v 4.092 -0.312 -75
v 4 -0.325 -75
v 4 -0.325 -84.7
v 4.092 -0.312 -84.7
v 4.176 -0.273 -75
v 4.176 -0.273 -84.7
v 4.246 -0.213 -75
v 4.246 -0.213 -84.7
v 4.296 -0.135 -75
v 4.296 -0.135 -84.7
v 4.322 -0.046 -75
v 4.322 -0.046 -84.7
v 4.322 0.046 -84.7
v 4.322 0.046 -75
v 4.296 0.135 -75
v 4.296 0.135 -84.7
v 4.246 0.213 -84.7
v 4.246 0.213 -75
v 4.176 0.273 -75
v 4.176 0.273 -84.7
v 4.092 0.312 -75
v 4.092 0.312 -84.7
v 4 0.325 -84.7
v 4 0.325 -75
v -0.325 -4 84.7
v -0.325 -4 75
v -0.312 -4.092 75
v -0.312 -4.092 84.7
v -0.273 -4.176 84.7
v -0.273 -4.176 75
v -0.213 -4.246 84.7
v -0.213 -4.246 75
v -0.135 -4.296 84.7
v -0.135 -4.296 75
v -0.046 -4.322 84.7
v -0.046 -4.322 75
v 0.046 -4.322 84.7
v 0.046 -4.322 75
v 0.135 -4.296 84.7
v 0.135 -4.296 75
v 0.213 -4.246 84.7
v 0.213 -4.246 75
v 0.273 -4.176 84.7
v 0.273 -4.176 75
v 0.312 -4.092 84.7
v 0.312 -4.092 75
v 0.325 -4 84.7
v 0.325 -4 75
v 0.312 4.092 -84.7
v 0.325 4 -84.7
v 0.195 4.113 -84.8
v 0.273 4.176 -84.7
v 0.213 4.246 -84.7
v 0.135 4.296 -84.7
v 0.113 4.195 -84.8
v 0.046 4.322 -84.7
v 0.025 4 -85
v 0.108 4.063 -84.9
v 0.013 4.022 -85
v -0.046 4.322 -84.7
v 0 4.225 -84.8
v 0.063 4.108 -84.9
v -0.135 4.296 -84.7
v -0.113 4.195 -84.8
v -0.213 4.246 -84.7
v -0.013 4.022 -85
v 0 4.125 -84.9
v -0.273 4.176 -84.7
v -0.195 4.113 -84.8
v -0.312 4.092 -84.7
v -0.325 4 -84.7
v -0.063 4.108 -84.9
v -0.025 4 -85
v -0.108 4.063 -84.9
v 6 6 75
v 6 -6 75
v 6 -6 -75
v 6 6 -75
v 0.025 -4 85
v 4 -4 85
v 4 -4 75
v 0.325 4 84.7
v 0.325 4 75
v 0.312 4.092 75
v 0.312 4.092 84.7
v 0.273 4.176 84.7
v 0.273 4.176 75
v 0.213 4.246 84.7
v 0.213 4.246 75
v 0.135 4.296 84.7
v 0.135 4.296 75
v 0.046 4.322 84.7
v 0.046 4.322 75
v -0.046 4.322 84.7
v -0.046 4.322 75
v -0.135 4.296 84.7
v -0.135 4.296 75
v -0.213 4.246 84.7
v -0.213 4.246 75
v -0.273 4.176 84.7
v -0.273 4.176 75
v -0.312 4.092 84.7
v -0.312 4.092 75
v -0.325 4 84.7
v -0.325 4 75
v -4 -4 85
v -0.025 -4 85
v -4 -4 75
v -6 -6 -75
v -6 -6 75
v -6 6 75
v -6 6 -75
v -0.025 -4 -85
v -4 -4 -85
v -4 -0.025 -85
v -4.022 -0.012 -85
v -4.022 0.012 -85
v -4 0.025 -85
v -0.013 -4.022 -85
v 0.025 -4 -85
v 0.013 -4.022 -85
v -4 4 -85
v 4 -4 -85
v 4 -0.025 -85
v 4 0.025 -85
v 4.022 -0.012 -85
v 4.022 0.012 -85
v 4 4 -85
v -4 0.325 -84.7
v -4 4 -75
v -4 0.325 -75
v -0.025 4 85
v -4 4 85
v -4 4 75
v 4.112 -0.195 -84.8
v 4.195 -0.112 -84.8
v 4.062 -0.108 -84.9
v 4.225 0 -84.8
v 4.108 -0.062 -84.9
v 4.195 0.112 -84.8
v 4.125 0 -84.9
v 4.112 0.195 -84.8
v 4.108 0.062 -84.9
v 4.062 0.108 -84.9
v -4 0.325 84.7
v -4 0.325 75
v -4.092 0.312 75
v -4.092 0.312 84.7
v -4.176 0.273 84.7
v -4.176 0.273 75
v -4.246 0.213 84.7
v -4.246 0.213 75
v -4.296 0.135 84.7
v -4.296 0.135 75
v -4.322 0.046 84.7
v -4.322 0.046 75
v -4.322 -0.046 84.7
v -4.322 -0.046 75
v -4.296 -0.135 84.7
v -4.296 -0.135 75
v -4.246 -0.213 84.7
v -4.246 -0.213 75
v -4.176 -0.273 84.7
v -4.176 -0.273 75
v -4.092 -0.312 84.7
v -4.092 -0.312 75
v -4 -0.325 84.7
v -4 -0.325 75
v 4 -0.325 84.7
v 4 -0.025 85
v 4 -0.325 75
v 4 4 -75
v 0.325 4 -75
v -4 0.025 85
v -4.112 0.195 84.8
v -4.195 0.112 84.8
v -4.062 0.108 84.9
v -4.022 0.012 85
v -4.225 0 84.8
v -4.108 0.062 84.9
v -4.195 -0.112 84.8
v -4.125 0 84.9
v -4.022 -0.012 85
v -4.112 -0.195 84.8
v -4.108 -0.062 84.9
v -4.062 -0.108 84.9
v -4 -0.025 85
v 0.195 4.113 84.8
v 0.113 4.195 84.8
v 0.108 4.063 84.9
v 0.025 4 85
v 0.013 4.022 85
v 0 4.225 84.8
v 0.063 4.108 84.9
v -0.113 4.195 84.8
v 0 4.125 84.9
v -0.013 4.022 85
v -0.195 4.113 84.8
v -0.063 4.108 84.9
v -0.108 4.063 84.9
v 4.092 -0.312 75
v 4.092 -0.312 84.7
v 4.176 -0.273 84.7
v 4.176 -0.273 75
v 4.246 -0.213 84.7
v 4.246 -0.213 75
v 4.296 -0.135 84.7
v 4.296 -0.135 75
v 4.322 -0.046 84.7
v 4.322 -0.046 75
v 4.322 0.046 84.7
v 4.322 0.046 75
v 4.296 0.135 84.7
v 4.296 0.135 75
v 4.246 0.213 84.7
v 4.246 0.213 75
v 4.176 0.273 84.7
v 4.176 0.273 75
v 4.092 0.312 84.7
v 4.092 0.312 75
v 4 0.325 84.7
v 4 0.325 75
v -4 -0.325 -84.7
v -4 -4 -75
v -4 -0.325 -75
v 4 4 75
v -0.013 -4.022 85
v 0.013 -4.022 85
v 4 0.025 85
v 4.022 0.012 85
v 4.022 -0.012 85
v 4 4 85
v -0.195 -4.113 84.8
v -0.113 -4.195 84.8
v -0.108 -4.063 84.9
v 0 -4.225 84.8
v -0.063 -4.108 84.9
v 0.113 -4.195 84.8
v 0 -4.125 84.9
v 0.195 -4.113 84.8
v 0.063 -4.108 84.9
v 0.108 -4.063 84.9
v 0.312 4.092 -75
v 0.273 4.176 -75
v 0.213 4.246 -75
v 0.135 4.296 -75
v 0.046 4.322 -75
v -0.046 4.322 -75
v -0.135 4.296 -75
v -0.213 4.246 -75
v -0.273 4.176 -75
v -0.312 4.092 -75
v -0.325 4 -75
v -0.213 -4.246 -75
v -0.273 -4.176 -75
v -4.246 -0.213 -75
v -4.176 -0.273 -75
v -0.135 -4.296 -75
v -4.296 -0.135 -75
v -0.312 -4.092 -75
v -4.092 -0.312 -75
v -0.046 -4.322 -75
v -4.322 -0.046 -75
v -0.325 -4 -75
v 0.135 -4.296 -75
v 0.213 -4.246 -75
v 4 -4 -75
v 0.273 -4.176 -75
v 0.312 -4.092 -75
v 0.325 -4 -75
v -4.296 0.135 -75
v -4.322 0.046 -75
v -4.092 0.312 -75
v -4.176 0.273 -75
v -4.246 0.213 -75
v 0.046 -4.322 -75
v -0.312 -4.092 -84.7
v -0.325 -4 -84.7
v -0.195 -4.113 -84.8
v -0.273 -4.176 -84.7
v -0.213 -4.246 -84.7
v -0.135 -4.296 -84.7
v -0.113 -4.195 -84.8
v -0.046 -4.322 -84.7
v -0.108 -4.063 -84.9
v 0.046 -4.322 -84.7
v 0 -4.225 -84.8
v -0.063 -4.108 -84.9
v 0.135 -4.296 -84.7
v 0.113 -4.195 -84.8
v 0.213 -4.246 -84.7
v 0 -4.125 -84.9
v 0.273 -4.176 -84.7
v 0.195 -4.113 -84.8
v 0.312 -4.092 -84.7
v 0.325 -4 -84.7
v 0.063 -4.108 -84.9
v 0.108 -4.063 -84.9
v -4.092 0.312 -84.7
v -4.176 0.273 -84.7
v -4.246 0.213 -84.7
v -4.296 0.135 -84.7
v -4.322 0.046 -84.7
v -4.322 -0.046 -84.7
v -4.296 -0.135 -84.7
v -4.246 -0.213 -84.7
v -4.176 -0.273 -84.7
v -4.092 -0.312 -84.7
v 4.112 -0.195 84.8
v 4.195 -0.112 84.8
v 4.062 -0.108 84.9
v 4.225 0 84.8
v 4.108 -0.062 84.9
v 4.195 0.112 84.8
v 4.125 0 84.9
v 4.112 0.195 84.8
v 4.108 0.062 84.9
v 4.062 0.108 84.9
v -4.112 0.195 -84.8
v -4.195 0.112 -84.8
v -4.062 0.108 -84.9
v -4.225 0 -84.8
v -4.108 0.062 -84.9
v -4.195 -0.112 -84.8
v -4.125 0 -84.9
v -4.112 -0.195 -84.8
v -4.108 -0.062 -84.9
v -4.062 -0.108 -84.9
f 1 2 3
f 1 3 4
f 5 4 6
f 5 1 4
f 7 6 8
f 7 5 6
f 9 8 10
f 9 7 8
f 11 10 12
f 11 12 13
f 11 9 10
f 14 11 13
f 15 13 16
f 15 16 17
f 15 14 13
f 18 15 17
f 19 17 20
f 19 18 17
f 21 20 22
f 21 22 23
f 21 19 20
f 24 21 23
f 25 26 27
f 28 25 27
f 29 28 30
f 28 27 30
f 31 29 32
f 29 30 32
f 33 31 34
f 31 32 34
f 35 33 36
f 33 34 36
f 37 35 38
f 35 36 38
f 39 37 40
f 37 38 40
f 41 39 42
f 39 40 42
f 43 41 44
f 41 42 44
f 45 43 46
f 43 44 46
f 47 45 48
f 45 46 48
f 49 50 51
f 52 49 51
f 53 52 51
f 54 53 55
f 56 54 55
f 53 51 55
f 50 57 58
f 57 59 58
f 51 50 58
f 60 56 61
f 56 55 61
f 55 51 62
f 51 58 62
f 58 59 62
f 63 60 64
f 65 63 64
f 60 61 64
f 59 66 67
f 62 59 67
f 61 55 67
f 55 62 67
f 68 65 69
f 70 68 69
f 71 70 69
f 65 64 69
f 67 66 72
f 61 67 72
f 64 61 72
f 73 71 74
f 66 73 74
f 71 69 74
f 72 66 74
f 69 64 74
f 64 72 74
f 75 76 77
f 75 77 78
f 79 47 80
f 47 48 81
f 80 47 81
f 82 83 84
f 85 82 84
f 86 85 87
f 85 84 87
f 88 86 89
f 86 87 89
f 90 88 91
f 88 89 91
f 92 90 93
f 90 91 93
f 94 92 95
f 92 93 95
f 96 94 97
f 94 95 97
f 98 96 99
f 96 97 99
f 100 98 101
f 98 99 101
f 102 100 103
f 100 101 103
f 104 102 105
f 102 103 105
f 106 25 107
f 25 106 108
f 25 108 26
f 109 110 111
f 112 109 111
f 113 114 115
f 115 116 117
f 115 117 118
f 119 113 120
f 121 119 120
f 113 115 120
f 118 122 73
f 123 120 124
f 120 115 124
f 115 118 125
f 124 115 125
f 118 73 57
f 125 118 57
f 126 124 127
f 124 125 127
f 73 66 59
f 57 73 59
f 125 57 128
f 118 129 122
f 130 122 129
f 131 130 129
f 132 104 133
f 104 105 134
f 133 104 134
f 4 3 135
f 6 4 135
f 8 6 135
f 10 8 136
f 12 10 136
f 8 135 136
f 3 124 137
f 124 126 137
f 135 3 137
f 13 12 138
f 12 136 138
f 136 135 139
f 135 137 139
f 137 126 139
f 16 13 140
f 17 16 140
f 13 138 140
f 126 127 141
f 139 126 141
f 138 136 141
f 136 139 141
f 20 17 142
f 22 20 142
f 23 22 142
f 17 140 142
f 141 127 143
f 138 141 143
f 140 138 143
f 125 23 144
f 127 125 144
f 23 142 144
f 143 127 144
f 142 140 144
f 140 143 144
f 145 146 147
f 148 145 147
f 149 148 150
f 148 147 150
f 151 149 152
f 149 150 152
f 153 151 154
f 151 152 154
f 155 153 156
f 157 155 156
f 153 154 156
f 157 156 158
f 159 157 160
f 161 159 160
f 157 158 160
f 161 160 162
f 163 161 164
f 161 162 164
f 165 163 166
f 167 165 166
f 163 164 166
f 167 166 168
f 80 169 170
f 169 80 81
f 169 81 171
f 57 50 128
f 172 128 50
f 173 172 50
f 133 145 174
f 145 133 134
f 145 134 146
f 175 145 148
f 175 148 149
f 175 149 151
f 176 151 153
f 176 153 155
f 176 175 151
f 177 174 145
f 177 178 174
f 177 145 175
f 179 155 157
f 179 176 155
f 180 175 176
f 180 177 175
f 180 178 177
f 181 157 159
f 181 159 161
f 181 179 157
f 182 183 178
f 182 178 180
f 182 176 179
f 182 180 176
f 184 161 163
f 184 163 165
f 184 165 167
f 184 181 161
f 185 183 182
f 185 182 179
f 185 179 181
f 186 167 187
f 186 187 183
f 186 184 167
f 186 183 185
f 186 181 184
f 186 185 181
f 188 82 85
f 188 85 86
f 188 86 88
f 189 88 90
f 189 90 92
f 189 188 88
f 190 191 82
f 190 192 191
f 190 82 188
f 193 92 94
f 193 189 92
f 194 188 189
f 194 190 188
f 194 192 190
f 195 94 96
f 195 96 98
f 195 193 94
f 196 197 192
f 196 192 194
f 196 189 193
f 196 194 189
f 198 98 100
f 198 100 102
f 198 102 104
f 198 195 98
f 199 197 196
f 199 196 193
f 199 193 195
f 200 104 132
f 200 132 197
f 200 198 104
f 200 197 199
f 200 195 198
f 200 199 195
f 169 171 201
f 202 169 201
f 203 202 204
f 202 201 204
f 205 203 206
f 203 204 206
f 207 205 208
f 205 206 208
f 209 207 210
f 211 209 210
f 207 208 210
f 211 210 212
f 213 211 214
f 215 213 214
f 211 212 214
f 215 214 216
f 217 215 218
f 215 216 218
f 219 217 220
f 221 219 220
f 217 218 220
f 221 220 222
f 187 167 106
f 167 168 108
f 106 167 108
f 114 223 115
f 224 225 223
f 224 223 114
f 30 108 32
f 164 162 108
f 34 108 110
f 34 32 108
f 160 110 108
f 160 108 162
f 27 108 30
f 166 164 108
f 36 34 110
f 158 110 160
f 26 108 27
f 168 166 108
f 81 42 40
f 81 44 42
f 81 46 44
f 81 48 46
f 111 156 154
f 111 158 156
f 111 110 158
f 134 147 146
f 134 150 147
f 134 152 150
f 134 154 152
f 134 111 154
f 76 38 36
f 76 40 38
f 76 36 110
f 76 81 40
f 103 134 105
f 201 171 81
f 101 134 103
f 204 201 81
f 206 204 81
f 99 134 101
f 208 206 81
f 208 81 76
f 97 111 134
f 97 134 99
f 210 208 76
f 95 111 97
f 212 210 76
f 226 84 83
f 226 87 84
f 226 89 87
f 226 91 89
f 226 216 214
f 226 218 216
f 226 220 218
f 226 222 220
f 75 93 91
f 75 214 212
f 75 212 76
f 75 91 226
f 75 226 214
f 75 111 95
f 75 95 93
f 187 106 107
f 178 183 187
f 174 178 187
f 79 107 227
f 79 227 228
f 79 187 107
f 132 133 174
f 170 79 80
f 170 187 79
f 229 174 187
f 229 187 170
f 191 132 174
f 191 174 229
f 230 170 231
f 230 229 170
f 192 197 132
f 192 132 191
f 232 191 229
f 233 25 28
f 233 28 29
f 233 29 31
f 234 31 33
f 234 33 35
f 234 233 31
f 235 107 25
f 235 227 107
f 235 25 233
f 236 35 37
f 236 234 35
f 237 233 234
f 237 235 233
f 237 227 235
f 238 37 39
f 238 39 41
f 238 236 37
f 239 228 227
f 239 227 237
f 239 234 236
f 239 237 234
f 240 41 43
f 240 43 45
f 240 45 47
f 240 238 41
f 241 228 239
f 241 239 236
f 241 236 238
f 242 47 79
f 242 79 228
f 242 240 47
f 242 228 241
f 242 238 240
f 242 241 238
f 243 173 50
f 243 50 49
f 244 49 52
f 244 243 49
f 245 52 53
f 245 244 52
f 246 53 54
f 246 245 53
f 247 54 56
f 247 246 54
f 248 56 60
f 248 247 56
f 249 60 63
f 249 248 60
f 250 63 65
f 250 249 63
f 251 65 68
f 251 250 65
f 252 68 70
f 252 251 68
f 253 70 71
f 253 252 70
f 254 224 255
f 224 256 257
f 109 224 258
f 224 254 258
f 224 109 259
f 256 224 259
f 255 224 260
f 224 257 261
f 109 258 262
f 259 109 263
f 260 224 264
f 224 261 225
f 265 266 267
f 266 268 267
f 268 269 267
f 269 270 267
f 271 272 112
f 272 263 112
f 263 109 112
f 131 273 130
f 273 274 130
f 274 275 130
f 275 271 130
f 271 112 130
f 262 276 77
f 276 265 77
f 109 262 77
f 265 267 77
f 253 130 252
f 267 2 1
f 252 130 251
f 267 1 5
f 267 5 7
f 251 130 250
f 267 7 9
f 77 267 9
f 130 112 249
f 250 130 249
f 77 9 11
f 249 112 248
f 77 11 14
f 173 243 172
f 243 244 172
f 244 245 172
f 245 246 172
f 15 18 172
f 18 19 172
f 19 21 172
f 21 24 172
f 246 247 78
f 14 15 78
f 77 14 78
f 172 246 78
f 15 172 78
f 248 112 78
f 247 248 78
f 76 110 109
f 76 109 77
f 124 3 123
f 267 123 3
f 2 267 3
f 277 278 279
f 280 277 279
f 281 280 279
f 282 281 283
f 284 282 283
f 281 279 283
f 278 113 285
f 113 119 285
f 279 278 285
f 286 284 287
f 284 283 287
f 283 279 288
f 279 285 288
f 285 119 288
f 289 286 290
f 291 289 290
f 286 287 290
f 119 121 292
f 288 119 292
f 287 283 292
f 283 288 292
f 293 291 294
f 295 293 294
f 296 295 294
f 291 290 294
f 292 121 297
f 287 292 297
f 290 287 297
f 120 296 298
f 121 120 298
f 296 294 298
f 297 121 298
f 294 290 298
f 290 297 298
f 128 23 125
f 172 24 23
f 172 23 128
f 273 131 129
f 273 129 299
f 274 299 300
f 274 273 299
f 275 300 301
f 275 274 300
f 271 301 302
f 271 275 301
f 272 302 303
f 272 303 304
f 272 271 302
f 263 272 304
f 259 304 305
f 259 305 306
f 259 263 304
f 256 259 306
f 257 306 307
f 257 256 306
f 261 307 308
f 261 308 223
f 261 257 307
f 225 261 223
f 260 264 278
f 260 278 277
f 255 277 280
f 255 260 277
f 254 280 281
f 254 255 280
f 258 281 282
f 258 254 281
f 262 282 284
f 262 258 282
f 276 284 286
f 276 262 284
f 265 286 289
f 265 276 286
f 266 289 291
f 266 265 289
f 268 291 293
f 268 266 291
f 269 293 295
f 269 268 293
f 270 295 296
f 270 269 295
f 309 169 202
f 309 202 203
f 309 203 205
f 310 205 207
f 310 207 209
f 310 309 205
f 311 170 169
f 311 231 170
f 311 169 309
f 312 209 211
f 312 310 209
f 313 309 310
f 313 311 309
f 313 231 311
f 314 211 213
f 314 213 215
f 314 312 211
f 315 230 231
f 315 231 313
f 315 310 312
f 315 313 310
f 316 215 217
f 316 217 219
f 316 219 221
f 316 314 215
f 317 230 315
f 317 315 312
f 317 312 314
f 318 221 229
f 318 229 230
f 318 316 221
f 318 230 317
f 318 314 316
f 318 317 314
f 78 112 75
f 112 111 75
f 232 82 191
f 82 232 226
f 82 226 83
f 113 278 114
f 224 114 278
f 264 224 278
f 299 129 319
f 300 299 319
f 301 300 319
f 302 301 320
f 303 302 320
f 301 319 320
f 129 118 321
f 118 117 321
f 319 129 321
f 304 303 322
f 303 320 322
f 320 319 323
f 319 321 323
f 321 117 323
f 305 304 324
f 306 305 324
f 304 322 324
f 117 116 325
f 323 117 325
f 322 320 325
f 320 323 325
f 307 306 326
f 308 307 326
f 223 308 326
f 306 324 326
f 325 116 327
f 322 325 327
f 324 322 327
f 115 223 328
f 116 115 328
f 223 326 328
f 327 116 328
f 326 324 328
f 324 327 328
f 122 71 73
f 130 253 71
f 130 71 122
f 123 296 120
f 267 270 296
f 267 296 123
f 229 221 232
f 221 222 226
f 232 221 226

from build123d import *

# Parameters (mm, degrees)
F0_W     = 12
F0_H     = 12
F1_DEPTH = 75
F3_DEPTH = 10
F4_SIZE  = 0.3


# Not quite as in the source:
# - a pattern or mirror of a feature is missing from the dataset's text; its kind, count and spacing are read off the source's solid


with BuildPart() as f1:
    # F0 (on Top) → F1 (new body, symmetric)
    with BuildSketch(Plane.XY):
        Rectangle(F0_W, F0_H)
    extrude(amount=F1_DEPTH, both=True)

    # F2 (on face) → F3 (join)
    with BuildSketch(Plane.XY.offset(75)):
        Polygon((-0.3250005729, 4), (-4, 4), (-4, 0.325), (-4, -0.325), (-4, -4), (-0.3250005729, -4), (0.3250005729, -4), (4, -4), (4, -0.325), (4, 0.325), (4, 4), (0.3250005729, 4), align=None)
        with BuildLine():
            ThreePointArc((0.3250005729, 4), (0, 4.3250005729), (-0.3250005729, 4))
            Line((-0.3250005729, 4), (0.3250005729, 4))
        make_face()
        with BuildLine():
            Line((-4, -0.325), (-4, 0.325))
            ThreePointArc((-4, 0.325), (-4.325, 0), (-4, -0.325))
        make_face()
        with BuildLine():
            ThreePointArc((4, -0.325), (4.325, 0), (4, 0.325))
            Line((4, 0.325), (4, -0.325))
        make_face()
        with BuildLine():
            Line((0.3250005729, -4), (-0.3250005729, -4))
            ThreePointArc((-0.3250005729, -4), (0, -4.3250005729), (0.3250005729, -4))
        make_face()
    f3 = extrude(amount=F3_DEPTH)

    # F3_copies: F3 across plane
    add(f3.mirror(Plane(origin=(0, 0, 0), x_dir=(-1, 0, 0), z_dir=(0, 0, -1))))

    # F4
    f4_edges = [f1.edges().sort_by_distance(p)[0] for p in [
        (0, -4.325001, 85),
        (4.325, 0, 85),
        (0, 4.325001, 85),
        (-4.325, 0, 85),
        (-4.325, 0, -85),
        (0, -4.325001, -85),
        (4.325, 0, -85),
        (0, 4.325001, -85),
    ]]
    chamfer(f4_edges, length=F4_SIZE)


solid = f1.part
